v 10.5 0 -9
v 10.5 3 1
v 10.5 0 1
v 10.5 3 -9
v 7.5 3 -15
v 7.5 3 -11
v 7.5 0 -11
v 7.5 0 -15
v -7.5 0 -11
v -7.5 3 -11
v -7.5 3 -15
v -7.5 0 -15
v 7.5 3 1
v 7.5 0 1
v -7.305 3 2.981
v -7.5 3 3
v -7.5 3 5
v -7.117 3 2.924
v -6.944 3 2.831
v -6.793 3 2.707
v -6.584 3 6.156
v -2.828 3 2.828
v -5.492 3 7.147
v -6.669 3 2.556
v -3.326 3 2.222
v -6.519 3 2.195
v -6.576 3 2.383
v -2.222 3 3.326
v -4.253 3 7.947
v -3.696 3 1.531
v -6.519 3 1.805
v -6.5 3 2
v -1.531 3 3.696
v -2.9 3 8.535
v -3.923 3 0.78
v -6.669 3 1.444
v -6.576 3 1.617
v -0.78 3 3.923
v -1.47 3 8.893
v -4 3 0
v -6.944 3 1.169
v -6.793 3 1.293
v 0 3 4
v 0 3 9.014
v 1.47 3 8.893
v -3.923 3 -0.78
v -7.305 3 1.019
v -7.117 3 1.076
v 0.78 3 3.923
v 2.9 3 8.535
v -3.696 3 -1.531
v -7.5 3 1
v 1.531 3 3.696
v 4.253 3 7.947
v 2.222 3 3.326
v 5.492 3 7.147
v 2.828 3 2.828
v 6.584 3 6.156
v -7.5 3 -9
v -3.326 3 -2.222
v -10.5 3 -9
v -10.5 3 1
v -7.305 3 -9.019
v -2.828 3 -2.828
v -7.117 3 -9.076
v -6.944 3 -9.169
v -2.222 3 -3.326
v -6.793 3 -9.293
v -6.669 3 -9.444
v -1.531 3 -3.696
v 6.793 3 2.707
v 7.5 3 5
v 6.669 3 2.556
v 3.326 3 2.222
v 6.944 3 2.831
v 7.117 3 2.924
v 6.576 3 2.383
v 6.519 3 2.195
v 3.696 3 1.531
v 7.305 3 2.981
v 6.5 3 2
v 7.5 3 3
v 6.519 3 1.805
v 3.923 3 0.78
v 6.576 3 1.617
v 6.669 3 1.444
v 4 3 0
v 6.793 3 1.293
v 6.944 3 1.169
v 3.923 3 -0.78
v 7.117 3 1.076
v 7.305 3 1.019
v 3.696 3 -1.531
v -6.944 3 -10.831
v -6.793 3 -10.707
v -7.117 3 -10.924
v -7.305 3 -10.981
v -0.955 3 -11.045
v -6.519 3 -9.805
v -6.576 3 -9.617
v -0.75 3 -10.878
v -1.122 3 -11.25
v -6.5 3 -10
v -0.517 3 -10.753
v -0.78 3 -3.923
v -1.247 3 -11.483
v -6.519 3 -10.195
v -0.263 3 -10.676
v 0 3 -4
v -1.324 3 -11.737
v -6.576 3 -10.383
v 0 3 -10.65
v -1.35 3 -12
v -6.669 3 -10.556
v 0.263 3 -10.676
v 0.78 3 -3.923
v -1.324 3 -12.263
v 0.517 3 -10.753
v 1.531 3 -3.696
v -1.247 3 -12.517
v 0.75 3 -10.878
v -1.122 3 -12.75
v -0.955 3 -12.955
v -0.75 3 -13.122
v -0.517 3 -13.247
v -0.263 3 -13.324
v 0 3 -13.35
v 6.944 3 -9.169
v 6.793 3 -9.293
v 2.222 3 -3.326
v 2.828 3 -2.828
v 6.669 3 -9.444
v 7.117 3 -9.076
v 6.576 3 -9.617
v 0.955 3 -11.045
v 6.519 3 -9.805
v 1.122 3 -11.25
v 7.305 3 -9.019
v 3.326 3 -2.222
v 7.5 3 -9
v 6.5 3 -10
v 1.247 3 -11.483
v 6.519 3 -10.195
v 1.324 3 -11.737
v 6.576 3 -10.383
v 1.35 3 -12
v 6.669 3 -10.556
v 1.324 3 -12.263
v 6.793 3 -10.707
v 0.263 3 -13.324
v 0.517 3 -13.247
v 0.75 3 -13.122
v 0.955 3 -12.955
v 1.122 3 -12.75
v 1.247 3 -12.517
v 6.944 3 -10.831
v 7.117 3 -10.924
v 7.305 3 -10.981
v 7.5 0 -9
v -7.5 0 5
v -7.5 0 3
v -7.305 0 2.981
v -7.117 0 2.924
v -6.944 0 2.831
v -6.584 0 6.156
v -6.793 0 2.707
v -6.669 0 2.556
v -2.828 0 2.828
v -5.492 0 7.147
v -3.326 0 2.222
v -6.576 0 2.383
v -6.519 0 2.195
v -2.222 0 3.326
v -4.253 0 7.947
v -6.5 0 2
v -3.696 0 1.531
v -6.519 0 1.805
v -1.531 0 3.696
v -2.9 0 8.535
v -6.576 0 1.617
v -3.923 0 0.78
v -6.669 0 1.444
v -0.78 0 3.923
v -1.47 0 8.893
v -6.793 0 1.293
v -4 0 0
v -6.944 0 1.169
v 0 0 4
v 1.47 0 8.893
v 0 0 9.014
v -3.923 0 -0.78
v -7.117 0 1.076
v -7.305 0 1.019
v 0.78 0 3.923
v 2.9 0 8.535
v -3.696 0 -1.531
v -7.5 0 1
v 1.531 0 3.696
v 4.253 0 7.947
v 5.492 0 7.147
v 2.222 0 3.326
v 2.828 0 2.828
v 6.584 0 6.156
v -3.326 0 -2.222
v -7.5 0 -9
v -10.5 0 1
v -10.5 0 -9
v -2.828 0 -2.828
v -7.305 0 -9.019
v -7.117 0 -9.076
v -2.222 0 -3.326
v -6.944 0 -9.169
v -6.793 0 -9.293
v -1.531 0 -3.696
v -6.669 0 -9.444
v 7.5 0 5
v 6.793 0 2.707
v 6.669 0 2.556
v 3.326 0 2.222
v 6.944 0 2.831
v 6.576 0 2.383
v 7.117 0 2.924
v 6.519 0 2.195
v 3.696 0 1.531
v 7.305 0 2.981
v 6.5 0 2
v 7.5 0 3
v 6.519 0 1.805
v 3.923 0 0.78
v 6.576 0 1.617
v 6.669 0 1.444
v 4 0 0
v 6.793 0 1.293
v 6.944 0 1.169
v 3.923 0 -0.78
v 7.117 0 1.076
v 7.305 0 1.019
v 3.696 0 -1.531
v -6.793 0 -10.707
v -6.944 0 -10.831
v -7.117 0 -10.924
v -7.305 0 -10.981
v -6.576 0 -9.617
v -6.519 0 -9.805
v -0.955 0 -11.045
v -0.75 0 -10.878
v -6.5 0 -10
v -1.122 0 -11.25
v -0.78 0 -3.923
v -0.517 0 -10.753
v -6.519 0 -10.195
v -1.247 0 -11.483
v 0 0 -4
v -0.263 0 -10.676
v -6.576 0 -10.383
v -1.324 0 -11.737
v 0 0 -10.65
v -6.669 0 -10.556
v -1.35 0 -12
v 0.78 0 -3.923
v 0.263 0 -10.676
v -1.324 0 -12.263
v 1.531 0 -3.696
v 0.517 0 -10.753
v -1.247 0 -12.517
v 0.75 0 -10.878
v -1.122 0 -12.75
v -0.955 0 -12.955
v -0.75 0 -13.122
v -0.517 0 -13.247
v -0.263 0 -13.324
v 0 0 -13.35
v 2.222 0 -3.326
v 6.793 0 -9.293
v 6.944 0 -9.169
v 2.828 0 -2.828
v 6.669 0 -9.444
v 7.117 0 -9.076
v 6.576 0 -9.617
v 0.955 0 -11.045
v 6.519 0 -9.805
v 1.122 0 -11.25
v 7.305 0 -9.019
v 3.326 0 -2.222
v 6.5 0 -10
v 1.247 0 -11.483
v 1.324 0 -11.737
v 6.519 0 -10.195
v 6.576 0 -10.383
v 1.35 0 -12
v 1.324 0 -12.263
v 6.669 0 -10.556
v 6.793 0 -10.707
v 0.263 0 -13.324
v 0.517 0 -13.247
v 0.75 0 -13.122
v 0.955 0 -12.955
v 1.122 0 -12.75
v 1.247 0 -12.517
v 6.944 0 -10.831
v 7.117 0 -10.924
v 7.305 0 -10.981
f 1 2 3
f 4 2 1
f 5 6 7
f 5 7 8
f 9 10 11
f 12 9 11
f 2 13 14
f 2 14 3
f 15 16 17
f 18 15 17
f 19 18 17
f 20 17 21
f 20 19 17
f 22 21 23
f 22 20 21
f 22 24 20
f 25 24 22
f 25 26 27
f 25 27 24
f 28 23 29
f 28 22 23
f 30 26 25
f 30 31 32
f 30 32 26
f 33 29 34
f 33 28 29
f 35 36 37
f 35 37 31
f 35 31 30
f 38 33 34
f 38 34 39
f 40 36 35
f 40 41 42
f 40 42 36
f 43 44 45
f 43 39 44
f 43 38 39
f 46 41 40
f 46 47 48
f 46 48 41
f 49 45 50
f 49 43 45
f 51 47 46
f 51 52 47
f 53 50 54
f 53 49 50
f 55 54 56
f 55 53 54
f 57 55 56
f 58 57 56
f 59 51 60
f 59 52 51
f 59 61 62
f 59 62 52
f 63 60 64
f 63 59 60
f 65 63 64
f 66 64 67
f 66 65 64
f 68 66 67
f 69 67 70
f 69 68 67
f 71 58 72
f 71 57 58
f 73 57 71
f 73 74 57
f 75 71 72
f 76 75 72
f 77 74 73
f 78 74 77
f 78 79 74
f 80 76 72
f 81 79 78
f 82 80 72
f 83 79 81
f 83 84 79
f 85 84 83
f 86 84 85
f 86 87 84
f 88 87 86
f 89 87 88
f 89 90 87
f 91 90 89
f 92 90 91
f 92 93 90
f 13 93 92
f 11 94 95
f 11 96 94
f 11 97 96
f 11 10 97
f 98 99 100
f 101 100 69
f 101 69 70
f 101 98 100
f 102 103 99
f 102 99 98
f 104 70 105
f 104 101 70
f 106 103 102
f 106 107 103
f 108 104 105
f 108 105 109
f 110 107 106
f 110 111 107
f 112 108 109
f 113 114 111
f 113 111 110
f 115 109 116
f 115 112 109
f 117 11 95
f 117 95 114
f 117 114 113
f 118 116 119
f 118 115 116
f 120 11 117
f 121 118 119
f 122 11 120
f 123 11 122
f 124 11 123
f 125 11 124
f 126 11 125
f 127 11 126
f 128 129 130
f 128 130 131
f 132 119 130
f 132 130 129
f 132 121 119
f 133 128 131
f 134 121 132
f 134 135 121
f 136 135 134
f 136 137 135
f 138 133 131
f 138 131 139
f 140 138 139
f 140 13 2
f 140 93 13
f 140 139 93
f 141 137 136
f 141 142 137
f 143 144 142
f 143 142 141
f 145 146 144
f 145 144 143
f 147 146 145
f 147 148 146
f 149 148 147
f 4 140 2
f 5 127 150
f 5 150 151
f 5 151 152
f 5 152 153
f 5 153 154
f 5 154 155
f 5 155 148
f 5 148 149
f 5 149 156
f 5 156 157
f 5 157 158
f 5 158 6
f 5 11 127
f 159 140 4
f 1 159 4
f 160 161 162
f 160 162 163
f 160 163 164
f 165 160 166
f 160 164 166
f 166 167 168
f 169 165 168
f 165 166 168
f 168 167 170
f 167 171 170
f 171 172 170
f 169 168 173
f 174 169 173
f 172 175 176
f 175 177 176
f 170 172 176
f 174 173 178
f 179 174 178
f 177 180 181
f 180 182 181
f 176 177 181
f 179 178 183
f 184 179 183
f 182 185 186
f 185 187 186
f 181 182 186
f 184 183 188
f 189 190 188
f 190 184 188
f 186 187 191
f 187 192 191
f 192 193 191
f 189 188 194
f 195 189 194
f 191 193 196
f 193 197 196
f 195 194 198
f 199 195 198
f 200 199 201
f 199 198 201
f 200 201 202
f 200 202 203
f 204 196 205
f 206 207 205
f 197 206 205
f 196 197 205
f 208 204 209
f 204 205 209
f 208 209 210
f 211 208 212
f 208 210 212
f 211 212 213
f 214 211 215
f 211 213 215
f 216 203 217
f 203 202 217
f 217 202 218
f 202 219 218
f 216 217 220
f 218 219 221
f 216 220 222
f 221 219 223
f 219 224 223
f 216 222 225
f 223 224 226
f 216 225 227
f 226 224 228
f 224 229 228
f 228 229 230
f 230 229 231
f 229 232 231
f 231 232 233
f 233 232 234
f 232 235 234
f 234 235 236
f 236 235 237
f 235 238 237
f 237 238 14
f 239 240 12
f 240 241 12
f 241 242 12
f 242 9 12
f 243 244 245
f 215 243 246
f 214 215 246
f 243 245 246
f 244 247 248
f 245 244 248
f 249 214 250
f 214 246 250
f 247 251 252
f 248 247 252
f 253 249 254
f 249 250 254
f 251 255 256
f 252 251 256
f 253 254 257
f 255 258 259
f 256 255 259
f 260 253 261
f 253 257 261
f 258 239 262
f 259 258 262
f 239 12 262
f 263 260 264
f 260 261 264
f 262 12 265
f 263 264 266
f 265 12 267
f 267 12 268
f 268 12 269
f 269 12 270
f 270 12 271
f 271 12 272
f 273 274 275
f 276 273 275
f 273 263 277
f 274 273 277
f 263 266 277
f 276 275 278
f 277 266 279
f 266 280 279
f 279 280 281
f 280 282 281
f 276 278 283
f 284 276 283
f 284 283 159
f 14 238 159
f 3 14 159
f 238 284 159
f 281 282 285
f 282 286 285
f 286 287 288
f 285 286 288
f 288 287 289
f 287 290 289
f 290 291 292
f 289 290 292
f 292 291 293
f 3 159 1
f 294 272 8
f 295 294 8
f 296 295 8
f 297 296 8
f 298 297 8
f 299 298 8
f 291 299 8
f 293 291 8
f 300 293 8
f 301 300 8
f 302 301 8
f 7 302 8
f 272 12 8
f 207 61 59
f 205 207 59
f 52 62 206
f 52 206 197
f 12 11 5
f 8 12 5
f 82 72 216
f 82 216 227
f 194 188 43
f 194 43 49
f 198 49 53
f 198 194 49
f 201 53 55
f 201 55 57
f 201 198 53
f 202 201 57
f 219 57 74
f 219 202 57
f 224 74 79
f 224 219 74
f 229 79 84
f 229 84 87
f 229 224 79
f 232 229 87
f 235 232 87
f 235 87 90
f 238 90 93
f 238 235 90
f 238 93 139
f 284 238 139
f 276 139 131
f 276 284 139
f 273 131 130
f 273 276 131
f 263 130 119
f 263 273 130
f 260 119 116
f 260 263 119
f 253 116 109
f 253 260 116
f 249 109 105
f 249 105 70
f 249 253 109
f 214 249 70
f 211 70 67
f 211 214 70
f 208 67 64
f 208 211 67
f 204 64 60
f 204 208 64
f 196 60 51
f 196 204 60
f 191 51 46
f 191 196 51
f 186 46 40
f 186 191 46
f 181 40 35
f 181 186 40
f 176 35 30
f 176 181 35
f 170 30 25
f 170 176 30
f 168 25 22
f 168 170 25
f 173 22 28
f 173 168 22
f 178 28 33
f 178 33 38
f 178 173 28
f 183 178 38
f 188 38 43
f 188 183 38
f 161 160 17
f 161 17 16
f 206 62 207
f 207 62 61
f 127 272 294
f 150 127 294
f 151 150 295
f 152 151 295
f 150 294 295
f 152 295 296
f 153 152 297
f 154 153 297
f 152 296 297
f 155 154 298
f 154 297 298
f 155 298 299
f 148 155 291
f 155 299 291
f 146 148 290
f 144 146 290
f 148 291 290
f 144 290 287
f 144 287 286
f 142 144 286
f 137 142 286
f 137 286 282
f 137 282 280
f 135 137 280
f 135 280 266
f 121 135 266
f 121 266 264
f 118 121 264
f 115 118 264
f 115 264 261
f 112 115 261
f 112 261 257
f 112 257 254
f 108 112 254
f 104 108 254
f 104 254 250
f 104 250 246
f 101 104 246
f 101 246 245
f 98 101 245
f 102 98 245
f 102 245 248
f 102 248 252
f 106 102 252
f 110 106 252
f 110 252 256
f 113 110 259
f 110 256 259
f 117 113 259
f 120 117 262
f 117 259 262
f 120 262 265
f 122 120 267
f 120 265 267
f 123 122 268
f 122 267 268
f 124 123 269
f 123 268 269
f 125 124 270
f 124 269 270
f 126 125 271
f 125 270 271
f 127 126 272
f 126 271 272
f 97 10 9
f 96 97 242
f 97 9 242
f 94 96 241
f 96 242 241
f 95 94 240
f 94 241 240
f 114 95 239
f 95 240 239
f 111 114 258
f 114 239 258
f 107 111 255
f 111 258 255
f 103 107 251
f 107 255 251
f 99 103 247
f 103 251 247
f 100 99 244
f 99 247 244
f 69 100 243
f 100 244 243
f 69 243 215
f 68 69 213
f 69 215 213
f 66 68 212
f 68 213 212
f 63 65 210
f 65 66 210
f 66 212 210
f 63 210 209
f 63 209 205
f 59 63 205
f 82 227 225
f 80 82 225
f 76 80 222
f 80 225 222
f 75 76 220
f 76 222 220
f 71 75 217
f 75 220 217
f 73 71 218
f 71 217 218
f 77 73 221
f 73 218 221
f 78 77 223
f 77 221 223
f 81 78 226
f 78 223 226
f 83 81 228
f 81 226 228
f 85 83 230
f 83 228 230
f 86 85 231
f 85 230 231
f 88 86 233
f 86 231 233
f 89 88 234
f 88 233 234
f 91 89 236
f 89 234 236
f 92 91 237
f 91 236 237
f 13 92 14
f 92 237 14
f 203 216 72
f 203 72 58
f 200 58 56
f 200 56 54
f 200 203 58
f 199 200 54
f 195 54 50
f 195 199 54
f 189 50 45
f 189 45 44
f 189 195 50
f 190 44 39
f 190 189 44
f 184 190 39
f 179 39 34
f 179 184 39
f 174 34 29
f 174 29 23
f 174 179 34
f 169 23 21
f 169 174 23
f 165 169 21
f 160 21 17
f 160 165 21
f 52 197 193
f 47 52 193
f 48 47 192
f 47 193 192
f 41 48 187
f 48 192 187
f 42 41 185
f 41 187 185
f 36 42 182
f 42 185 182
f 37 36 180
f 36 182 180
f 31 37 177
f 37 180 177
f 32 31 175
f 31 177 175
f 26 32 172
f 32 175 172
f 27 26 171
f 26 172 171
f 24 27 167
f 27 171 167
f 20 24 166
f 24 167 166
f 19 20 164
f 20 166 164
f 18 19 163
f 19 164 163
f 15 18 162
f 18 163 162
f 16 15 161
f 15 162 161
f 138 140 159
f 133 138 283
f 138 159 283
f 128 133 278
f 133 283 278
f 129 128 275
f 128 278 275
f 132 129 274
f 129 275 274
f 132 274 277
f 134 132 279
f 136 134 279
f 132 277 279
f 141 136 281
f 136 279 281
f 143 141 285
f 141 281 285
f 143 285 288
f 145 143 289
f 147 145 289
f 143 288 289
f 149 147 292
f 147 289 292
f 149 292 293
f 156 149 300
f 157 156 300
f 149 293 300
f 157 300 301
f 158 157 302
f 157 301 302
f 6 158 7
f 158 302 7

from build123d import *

# Parameters (mm, degrees)
SKETCH_1_R          = 4
EXTRUDE_1_DEPTH     = 3
SKETCH_3_W          = 15
SKETCH_3_H          = 10
EXTRUDE_3_DEPTH     = 3
SKETCH_2_W          = 3
SKETCH_2_H          = 10
EXTRUDE_4_DEPTH     = 3
SKETCH_4_R          = 1
CUT_EXTRUDE_1_DEPTH = 19.553975315
SKETCH_5_R          = 1.35
CUT_EXTRUDE_2_DEPTH = 19.553975315


with BuildPart() as part:
    # 草图1 → 凸台-拉伸1 (new body)
    with BuildSketch(Plane(origin=(0, 0, 0), x_dir=(1, 0, 0), z_dir=(0, 1, 0))):
        with BuildLine():
            Line((-7.5, 0), (-7.5, 5))
            Line((-7.5, 5), (7.5, 5))
            Line((7.5, 5), (7.5, 0))
            Line((7.5, 0), (7.5, -5))
            ThreePointArc((7.5, -5), (0, -9.013878189), (-7.5, -5))
            Line((-7.5, -5), (-7.5, 0))
        make_face()
        with Locations(Location((0, 0, 0), (0, 0, 270))):
            Circle(SKETCH_1_R, mode=Mode.SUBTRACT)
    extrude(amount=EXTRUDE_1_DEPTH)

    # 草图3 → 凸台-拉伸3 (add)
    with BuildSketch(Plane(origin=(0, 3, 0), x_dir=(1, 0, 0), z_dir=(0, 1, 0))):
        with Locations((0, 10)):
            Rectangle(SKETCH_3_W, SKETCH_3_H)
    extrude(amount=-EXTRUDE_3_DEPTH)

    # 草图2 → 凸台-拉伸4 (add)
    with BuildSketch(Plane(origin=(0, 3, 0), x_dir=(1, 0, 0), z_dir=(0, 1, 0))):
        with Locations((9, 4)):
            Rectangle(SKETCH_2_W, SKETCH_2_H)
        with Locations((-9, 4)):
            Rectangle(SKETCH_2_W, SKETCH_2_H)
    extrude(amount=-EXTRUDE_4_DEPTH)

    # 草图4 → 切除-拉伸1 (cut, through all)
    with BuildSketch(Plane.XZ):
        with Locations((7.5, -10)):
            Circle(SKETCH_4_R)
        with Locations((7.5, 2)):
            Circle(SKETCH_4_R)
        with Locations((-7.5, 2)):
            Circle(SKETCH_4_R)
        with Locations((-7.5, -10)):
            Circle(SKETCH_4_R)
    extrude(amount=-CUT_EXTRUDE_1_DEPTH, mode=Mode.SUBTRACT)

    # 草图5 → 切除-拉伸2 (cut, through all)
    with BuildSketch(Plane.XZ):
        with Locations(Location((0, -12, 0), (0, 0, 270))):
            Circle(SKETCH_5_R)
    extrude(amount=-CUT_EXTRUDE_2_DEPTH, mode=Mode.SUBTRACT)


solid = part.part
